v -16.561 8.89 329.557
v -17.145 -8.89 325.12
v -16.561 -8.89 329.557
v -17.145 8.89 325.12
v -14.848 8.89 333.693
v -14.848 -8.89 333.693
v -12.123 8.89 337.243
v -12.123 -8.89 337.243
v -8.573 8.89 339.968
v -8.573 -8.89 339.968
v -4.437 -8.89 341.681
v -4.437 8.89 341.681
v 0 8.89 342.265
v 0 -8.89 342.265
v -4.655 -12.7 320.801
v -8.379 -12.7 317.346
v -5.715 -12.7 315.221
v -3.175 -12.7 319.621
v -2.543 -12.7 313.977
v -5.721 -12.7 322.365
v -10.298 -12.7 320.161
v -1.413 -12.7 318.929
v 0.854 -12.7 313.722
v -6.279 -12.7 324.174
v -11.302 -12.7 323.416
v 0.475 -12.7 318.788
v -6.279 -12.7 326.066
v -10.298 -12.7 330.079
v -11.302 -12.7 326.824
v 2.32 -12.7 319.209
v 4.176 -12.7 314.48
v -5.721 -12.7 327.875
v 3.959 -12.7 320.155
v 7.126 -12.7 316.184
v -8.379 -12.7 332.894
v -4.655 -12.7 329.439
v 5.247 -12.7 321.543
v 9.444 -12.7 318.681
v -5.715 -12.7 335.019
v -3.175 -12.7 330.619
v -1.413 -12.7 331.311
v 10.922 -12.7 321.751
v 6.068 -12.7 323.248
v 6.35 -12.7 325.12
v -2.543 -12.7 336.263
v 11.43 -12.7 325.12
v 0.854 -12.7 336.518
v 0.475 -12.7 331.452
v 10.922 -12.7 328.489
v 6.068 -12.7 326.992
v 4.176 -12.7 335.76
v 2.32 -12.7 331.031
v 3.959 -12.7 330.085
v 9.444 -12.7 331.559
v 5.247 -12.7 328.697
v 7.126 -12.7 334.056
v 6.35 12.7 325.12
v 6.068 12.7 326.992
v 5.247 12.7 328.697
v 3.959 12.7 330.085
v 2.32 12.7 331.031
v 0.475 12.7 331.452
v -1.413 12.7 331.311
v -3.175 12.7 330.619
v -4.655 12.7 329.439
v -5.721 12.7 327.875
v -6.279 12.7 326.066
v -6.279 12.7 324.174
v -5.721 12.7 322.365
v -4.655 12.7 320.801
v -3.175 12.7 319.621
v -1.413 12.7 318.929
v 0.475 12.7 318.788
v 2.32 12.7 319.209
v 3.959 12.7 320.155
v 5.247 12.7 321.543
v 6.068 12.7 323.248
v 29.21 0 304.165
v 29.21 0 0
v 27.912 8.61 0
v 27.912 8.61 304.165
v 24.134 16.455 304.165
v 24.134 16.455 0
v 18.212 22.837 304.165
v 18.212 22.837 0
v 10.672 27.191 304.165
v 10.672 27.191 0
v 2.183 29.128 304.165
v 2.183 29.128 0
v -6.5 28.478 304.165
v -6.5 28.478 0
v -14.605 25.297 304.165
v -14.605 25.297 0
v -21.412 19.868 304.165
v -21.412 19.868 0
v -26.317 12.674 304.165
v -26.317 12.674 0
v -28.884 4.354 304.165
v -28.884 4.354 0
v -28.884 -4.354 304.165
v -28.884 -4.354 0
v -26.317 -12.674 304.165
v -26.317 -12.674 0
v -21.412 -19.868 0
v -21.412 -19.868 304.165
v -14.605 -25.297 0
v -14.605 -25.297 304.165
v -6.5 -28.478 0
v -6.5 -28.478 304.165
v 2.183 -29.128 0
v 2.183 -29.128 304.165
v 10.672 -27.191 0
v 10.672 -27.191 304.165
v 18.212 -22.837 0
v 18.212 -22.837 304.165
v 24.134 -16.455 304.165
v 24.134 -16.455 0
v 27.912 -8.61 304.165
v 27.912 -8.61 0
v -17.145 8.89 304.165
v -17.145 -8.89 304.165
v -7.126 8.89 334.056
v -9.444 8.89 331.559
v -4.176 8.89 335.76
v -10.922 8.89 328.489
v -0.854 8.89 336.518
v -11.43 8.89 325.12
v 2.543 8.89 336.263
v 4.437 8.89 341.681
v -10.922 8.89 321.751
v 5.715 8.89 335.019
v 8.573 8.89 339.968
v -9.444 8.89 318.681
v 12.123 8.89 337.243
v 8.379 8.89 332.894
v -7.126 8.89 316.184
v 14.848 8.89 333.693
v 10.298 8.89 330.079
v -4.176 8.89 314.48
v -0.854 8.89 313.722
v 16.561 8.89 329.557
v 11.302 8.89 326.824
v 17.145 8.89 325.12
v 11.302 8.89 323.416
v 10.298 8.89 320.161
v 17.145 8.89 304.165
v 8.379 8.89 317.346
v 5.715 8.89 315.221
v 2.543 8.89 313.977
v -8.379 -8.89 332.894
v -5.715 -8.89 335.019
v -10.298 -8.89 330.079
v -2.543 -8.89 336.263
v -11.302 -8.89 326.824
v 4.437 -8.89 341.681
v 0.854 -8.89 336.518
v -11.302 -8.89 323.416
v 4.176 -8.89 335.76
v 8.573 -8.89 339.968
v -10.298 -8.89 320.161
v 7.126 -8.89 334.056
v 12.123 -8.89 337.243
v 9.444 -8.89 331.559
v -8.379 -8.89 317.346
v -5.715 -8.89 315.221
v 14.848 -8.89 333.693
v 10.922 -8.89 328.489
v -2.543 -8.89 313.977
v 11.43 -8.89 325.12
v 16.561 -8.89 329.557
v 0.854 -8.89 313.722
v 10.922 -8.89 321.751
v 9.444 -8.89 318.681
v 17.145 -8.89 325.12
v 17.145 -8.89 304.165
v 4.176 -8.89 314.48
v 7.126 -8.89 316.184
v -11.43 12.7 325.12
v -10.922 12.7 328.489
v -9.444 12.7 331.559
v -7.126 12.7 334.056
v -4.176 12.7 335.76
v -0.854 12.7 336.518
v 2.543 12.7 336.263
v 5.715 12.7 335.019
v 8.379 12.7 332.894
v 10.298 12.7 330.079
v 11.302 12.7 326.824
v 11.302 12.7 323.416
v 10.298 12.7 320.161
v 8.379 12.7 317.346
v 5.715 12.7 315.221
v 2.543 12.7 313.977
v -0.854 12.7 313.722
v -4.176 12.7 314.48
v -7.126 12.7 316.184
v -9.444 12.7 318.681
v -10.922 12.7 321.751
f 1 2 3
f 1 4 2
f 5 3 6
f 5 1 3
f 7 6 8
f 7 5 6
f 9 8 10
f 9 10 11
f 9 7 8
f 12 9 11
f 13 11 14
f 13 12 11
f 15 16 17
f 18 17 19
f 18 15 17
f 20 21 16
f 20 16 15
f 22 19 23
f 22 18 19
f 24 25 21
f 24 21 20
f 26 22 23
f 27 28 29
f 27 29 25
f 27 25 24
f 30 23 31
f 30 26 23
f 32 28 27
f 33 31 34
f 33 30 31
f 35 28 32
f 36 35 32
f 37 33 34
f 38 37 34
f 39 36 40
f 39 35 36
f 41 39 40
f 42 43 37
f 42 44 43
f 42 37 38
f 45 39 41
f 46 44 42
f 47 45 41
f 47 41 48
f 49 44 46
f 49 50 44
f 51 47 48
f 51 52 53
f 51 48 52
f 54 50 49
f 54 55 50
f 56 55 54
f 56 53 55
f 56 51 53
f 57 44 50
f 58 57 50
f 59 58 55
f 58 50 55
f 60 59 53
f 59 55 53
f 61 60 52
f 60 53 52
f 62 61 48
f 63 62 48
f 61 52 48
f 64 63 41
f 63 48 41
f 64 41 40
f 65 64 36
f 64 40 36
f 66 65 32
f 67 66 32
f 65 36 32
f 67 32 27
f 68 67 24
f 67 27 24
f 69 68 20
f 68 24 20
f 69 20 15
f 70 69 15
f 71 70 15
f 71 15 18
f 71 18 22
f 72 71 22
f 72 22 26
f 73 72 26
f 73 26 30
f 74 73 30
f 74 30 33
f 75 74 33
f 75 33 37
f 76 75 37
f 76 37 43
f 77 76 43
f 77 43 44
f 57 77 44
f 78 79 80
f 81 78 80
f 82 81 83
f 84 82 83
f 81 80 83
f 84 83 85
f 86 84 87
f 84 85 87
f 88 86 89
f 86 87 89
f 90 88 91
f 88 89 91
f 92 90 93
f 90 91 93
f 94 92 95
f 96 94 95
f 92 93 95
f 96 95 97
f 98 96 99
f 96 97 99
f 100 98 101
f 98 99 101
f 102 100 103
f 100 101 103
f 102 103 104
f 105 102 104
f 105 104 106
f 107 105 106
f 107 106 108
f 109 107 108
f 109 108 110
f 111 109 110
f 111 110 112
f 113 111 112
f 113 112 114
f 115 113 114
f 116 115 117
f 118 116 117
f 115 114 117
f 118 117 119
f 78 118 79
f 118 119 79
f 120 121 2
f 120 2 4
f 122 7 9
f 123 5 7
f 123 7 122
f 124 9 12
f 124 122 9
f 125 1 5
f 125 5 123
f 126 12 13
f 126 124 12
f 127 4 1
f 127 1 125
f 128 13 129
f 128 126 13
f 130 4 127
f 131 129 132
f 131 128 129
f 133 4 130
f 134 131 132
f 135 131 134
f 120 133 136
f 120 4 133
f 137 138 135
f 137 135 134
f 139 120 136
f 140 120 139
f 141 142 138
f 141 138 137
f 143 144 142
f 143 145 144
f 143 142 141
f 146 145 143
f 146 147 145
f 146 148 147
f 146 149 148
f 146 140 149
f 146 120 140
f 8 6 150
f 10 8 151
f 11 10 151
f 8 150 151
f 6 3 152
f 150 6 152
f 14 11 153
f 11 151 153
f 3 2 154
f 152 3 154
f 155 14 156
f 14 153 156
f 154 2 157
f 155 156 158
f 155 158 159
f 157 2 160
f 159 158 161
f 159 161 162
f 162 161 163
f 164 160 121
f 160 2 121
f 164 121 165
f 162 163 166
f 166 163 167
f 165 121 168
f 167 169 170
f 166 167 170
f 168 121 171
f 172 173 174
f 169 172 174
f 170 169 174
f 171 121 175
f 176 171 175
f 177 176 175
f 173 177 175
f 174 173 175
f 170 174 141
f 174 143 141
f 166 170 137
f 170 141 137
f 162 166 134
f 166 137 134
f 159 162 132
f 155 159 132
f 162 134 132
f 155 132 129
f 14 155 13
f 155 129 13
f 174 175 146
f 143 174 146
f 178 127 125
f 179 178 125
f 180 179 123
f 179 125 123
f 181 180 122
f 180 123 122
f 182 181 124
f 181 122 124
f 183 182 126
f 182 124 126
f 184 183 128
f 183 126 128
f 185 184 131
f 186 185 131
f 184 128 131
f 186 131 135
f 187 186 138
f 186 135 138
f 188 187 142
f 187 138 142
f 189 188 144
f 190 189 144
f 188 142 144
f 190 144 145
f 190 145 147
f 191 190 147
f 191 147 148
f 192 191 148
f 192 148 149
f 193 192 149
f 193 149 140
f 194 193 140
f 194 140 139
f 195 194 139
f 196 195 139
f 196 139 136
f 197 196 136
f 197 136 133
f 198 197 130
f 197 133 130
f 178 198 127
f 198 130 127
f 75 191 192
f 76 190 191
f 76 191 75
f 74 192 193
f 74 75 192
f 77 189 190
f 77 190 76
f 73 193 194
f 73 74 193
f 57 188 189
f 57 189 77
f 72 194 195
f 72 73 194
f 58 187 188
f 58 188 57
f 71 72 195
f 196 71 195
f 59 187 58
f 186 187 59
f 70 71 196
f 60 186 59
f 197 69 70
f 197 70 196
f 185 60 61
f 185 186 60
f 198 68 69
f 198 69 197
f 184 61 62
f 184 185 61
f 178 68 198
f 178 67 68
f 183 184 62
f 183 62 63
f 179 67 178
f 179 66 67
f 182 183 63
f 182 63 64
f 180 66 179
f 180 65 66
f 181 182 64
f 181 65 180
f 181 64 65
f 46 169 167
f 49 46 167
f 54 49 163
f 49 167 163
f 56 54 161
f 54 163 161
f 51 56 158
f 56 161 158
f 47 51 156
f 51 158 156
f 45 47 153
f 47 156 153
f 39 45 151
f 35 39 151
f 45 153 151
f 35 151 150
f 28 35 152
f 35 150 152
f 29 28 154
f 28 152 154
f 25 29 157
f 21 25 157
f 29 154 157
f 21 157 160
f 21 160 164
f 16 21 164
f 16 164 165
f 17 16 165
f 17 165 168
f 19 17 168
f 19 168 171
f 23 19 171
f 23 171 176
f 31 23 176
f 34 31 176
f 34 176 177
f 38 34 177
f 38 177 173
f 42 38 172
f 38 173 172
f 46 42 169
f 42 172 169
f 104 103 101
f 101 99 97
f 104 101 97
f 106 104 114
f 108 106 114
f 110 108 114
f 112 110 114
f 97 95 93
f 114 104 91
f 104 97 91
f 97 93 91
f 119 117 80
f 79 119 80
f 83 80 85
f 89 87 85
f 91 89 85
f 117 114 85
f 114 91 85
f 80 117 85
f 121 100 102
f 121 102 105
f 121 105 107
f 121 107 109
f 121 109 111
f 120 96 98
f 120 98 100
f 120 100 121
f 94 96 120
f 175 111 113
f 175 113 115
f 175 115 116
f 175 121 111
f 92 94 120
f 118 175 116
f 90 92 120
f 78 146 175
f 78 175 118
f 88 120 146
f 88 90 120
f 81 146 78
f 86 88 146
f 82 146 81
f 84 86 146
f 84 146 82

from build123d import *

# Parameters (mm, degrees)
F0_R      = 29.21
F1_DEPTH  = 304.165
F2_W      = 34.29
F2_H      = 17.78
F3_DEPTH  = 38.1
F4_R      = 17.14499
F5_R      = 11.43
F6_DEPTH  = 3.81
F7_R      = 11.43
F8_DEPTH  = 3.81
F9_R      = 6.35
F10_DEPTH = 38.1


# Not quite as in the source:
# - a fillet or chamfer is up to 0.001 mm smaller than in the source, because OpenCascade refuses the exact size


with BuildPart() as f1:
    # F0 (on Top) → F1 (new body)
    with BuildSketch(Plane.XY):
        Circle(F0_R)
    extrude(amount=F1_DEPTH)

    # F2 (on face) → F3 (join)
    with BuildSketch(Plane.XY.offset(304.165)):
        Rectangle(F2_W, F2_H)
    extrude(amount=F3_DEPTH)

    # F4 (radius 17.145 in the source; OpenCascade refuses exactly that, so slightly less here)
    f4_edges = [f1.edges().sort_by_distance(p)[0] for p in [
        (17.145, 0, 342.265),
        (-17.145, 0, 342.265),
    ]]
    fillet(f4_edges, radius=F4_R)

    # F5 (on face) → F6 (join)
    with BuildSketch(Plane(origin=(0, 8.89, 0), x_dir=(-1, 0, 0), z_dir=(0, 1, 0))):
        with Locations((0, 325.12)):
            Circle(F5_R)
    extrude(amount=F6_DEPTH)

    # F7 (on face) → F8 (join)
    with BuildSketch(Plane.XZ.offset(8.89)):
        with Locations((0, 325.12)):
            Circle(F7_R)
    extrude(amount=F8_DEPTH)

    # F9 (on face) → F10 (cut)
    with BuildSketch(Plane.XZ.offset(12.7)):
        with Locations((0, 325.12)):
            Circle(F9_R)
    extrude(amount=-F10_DEPTH, mode=Mode.SUBTRACT)


solid = f1.part
